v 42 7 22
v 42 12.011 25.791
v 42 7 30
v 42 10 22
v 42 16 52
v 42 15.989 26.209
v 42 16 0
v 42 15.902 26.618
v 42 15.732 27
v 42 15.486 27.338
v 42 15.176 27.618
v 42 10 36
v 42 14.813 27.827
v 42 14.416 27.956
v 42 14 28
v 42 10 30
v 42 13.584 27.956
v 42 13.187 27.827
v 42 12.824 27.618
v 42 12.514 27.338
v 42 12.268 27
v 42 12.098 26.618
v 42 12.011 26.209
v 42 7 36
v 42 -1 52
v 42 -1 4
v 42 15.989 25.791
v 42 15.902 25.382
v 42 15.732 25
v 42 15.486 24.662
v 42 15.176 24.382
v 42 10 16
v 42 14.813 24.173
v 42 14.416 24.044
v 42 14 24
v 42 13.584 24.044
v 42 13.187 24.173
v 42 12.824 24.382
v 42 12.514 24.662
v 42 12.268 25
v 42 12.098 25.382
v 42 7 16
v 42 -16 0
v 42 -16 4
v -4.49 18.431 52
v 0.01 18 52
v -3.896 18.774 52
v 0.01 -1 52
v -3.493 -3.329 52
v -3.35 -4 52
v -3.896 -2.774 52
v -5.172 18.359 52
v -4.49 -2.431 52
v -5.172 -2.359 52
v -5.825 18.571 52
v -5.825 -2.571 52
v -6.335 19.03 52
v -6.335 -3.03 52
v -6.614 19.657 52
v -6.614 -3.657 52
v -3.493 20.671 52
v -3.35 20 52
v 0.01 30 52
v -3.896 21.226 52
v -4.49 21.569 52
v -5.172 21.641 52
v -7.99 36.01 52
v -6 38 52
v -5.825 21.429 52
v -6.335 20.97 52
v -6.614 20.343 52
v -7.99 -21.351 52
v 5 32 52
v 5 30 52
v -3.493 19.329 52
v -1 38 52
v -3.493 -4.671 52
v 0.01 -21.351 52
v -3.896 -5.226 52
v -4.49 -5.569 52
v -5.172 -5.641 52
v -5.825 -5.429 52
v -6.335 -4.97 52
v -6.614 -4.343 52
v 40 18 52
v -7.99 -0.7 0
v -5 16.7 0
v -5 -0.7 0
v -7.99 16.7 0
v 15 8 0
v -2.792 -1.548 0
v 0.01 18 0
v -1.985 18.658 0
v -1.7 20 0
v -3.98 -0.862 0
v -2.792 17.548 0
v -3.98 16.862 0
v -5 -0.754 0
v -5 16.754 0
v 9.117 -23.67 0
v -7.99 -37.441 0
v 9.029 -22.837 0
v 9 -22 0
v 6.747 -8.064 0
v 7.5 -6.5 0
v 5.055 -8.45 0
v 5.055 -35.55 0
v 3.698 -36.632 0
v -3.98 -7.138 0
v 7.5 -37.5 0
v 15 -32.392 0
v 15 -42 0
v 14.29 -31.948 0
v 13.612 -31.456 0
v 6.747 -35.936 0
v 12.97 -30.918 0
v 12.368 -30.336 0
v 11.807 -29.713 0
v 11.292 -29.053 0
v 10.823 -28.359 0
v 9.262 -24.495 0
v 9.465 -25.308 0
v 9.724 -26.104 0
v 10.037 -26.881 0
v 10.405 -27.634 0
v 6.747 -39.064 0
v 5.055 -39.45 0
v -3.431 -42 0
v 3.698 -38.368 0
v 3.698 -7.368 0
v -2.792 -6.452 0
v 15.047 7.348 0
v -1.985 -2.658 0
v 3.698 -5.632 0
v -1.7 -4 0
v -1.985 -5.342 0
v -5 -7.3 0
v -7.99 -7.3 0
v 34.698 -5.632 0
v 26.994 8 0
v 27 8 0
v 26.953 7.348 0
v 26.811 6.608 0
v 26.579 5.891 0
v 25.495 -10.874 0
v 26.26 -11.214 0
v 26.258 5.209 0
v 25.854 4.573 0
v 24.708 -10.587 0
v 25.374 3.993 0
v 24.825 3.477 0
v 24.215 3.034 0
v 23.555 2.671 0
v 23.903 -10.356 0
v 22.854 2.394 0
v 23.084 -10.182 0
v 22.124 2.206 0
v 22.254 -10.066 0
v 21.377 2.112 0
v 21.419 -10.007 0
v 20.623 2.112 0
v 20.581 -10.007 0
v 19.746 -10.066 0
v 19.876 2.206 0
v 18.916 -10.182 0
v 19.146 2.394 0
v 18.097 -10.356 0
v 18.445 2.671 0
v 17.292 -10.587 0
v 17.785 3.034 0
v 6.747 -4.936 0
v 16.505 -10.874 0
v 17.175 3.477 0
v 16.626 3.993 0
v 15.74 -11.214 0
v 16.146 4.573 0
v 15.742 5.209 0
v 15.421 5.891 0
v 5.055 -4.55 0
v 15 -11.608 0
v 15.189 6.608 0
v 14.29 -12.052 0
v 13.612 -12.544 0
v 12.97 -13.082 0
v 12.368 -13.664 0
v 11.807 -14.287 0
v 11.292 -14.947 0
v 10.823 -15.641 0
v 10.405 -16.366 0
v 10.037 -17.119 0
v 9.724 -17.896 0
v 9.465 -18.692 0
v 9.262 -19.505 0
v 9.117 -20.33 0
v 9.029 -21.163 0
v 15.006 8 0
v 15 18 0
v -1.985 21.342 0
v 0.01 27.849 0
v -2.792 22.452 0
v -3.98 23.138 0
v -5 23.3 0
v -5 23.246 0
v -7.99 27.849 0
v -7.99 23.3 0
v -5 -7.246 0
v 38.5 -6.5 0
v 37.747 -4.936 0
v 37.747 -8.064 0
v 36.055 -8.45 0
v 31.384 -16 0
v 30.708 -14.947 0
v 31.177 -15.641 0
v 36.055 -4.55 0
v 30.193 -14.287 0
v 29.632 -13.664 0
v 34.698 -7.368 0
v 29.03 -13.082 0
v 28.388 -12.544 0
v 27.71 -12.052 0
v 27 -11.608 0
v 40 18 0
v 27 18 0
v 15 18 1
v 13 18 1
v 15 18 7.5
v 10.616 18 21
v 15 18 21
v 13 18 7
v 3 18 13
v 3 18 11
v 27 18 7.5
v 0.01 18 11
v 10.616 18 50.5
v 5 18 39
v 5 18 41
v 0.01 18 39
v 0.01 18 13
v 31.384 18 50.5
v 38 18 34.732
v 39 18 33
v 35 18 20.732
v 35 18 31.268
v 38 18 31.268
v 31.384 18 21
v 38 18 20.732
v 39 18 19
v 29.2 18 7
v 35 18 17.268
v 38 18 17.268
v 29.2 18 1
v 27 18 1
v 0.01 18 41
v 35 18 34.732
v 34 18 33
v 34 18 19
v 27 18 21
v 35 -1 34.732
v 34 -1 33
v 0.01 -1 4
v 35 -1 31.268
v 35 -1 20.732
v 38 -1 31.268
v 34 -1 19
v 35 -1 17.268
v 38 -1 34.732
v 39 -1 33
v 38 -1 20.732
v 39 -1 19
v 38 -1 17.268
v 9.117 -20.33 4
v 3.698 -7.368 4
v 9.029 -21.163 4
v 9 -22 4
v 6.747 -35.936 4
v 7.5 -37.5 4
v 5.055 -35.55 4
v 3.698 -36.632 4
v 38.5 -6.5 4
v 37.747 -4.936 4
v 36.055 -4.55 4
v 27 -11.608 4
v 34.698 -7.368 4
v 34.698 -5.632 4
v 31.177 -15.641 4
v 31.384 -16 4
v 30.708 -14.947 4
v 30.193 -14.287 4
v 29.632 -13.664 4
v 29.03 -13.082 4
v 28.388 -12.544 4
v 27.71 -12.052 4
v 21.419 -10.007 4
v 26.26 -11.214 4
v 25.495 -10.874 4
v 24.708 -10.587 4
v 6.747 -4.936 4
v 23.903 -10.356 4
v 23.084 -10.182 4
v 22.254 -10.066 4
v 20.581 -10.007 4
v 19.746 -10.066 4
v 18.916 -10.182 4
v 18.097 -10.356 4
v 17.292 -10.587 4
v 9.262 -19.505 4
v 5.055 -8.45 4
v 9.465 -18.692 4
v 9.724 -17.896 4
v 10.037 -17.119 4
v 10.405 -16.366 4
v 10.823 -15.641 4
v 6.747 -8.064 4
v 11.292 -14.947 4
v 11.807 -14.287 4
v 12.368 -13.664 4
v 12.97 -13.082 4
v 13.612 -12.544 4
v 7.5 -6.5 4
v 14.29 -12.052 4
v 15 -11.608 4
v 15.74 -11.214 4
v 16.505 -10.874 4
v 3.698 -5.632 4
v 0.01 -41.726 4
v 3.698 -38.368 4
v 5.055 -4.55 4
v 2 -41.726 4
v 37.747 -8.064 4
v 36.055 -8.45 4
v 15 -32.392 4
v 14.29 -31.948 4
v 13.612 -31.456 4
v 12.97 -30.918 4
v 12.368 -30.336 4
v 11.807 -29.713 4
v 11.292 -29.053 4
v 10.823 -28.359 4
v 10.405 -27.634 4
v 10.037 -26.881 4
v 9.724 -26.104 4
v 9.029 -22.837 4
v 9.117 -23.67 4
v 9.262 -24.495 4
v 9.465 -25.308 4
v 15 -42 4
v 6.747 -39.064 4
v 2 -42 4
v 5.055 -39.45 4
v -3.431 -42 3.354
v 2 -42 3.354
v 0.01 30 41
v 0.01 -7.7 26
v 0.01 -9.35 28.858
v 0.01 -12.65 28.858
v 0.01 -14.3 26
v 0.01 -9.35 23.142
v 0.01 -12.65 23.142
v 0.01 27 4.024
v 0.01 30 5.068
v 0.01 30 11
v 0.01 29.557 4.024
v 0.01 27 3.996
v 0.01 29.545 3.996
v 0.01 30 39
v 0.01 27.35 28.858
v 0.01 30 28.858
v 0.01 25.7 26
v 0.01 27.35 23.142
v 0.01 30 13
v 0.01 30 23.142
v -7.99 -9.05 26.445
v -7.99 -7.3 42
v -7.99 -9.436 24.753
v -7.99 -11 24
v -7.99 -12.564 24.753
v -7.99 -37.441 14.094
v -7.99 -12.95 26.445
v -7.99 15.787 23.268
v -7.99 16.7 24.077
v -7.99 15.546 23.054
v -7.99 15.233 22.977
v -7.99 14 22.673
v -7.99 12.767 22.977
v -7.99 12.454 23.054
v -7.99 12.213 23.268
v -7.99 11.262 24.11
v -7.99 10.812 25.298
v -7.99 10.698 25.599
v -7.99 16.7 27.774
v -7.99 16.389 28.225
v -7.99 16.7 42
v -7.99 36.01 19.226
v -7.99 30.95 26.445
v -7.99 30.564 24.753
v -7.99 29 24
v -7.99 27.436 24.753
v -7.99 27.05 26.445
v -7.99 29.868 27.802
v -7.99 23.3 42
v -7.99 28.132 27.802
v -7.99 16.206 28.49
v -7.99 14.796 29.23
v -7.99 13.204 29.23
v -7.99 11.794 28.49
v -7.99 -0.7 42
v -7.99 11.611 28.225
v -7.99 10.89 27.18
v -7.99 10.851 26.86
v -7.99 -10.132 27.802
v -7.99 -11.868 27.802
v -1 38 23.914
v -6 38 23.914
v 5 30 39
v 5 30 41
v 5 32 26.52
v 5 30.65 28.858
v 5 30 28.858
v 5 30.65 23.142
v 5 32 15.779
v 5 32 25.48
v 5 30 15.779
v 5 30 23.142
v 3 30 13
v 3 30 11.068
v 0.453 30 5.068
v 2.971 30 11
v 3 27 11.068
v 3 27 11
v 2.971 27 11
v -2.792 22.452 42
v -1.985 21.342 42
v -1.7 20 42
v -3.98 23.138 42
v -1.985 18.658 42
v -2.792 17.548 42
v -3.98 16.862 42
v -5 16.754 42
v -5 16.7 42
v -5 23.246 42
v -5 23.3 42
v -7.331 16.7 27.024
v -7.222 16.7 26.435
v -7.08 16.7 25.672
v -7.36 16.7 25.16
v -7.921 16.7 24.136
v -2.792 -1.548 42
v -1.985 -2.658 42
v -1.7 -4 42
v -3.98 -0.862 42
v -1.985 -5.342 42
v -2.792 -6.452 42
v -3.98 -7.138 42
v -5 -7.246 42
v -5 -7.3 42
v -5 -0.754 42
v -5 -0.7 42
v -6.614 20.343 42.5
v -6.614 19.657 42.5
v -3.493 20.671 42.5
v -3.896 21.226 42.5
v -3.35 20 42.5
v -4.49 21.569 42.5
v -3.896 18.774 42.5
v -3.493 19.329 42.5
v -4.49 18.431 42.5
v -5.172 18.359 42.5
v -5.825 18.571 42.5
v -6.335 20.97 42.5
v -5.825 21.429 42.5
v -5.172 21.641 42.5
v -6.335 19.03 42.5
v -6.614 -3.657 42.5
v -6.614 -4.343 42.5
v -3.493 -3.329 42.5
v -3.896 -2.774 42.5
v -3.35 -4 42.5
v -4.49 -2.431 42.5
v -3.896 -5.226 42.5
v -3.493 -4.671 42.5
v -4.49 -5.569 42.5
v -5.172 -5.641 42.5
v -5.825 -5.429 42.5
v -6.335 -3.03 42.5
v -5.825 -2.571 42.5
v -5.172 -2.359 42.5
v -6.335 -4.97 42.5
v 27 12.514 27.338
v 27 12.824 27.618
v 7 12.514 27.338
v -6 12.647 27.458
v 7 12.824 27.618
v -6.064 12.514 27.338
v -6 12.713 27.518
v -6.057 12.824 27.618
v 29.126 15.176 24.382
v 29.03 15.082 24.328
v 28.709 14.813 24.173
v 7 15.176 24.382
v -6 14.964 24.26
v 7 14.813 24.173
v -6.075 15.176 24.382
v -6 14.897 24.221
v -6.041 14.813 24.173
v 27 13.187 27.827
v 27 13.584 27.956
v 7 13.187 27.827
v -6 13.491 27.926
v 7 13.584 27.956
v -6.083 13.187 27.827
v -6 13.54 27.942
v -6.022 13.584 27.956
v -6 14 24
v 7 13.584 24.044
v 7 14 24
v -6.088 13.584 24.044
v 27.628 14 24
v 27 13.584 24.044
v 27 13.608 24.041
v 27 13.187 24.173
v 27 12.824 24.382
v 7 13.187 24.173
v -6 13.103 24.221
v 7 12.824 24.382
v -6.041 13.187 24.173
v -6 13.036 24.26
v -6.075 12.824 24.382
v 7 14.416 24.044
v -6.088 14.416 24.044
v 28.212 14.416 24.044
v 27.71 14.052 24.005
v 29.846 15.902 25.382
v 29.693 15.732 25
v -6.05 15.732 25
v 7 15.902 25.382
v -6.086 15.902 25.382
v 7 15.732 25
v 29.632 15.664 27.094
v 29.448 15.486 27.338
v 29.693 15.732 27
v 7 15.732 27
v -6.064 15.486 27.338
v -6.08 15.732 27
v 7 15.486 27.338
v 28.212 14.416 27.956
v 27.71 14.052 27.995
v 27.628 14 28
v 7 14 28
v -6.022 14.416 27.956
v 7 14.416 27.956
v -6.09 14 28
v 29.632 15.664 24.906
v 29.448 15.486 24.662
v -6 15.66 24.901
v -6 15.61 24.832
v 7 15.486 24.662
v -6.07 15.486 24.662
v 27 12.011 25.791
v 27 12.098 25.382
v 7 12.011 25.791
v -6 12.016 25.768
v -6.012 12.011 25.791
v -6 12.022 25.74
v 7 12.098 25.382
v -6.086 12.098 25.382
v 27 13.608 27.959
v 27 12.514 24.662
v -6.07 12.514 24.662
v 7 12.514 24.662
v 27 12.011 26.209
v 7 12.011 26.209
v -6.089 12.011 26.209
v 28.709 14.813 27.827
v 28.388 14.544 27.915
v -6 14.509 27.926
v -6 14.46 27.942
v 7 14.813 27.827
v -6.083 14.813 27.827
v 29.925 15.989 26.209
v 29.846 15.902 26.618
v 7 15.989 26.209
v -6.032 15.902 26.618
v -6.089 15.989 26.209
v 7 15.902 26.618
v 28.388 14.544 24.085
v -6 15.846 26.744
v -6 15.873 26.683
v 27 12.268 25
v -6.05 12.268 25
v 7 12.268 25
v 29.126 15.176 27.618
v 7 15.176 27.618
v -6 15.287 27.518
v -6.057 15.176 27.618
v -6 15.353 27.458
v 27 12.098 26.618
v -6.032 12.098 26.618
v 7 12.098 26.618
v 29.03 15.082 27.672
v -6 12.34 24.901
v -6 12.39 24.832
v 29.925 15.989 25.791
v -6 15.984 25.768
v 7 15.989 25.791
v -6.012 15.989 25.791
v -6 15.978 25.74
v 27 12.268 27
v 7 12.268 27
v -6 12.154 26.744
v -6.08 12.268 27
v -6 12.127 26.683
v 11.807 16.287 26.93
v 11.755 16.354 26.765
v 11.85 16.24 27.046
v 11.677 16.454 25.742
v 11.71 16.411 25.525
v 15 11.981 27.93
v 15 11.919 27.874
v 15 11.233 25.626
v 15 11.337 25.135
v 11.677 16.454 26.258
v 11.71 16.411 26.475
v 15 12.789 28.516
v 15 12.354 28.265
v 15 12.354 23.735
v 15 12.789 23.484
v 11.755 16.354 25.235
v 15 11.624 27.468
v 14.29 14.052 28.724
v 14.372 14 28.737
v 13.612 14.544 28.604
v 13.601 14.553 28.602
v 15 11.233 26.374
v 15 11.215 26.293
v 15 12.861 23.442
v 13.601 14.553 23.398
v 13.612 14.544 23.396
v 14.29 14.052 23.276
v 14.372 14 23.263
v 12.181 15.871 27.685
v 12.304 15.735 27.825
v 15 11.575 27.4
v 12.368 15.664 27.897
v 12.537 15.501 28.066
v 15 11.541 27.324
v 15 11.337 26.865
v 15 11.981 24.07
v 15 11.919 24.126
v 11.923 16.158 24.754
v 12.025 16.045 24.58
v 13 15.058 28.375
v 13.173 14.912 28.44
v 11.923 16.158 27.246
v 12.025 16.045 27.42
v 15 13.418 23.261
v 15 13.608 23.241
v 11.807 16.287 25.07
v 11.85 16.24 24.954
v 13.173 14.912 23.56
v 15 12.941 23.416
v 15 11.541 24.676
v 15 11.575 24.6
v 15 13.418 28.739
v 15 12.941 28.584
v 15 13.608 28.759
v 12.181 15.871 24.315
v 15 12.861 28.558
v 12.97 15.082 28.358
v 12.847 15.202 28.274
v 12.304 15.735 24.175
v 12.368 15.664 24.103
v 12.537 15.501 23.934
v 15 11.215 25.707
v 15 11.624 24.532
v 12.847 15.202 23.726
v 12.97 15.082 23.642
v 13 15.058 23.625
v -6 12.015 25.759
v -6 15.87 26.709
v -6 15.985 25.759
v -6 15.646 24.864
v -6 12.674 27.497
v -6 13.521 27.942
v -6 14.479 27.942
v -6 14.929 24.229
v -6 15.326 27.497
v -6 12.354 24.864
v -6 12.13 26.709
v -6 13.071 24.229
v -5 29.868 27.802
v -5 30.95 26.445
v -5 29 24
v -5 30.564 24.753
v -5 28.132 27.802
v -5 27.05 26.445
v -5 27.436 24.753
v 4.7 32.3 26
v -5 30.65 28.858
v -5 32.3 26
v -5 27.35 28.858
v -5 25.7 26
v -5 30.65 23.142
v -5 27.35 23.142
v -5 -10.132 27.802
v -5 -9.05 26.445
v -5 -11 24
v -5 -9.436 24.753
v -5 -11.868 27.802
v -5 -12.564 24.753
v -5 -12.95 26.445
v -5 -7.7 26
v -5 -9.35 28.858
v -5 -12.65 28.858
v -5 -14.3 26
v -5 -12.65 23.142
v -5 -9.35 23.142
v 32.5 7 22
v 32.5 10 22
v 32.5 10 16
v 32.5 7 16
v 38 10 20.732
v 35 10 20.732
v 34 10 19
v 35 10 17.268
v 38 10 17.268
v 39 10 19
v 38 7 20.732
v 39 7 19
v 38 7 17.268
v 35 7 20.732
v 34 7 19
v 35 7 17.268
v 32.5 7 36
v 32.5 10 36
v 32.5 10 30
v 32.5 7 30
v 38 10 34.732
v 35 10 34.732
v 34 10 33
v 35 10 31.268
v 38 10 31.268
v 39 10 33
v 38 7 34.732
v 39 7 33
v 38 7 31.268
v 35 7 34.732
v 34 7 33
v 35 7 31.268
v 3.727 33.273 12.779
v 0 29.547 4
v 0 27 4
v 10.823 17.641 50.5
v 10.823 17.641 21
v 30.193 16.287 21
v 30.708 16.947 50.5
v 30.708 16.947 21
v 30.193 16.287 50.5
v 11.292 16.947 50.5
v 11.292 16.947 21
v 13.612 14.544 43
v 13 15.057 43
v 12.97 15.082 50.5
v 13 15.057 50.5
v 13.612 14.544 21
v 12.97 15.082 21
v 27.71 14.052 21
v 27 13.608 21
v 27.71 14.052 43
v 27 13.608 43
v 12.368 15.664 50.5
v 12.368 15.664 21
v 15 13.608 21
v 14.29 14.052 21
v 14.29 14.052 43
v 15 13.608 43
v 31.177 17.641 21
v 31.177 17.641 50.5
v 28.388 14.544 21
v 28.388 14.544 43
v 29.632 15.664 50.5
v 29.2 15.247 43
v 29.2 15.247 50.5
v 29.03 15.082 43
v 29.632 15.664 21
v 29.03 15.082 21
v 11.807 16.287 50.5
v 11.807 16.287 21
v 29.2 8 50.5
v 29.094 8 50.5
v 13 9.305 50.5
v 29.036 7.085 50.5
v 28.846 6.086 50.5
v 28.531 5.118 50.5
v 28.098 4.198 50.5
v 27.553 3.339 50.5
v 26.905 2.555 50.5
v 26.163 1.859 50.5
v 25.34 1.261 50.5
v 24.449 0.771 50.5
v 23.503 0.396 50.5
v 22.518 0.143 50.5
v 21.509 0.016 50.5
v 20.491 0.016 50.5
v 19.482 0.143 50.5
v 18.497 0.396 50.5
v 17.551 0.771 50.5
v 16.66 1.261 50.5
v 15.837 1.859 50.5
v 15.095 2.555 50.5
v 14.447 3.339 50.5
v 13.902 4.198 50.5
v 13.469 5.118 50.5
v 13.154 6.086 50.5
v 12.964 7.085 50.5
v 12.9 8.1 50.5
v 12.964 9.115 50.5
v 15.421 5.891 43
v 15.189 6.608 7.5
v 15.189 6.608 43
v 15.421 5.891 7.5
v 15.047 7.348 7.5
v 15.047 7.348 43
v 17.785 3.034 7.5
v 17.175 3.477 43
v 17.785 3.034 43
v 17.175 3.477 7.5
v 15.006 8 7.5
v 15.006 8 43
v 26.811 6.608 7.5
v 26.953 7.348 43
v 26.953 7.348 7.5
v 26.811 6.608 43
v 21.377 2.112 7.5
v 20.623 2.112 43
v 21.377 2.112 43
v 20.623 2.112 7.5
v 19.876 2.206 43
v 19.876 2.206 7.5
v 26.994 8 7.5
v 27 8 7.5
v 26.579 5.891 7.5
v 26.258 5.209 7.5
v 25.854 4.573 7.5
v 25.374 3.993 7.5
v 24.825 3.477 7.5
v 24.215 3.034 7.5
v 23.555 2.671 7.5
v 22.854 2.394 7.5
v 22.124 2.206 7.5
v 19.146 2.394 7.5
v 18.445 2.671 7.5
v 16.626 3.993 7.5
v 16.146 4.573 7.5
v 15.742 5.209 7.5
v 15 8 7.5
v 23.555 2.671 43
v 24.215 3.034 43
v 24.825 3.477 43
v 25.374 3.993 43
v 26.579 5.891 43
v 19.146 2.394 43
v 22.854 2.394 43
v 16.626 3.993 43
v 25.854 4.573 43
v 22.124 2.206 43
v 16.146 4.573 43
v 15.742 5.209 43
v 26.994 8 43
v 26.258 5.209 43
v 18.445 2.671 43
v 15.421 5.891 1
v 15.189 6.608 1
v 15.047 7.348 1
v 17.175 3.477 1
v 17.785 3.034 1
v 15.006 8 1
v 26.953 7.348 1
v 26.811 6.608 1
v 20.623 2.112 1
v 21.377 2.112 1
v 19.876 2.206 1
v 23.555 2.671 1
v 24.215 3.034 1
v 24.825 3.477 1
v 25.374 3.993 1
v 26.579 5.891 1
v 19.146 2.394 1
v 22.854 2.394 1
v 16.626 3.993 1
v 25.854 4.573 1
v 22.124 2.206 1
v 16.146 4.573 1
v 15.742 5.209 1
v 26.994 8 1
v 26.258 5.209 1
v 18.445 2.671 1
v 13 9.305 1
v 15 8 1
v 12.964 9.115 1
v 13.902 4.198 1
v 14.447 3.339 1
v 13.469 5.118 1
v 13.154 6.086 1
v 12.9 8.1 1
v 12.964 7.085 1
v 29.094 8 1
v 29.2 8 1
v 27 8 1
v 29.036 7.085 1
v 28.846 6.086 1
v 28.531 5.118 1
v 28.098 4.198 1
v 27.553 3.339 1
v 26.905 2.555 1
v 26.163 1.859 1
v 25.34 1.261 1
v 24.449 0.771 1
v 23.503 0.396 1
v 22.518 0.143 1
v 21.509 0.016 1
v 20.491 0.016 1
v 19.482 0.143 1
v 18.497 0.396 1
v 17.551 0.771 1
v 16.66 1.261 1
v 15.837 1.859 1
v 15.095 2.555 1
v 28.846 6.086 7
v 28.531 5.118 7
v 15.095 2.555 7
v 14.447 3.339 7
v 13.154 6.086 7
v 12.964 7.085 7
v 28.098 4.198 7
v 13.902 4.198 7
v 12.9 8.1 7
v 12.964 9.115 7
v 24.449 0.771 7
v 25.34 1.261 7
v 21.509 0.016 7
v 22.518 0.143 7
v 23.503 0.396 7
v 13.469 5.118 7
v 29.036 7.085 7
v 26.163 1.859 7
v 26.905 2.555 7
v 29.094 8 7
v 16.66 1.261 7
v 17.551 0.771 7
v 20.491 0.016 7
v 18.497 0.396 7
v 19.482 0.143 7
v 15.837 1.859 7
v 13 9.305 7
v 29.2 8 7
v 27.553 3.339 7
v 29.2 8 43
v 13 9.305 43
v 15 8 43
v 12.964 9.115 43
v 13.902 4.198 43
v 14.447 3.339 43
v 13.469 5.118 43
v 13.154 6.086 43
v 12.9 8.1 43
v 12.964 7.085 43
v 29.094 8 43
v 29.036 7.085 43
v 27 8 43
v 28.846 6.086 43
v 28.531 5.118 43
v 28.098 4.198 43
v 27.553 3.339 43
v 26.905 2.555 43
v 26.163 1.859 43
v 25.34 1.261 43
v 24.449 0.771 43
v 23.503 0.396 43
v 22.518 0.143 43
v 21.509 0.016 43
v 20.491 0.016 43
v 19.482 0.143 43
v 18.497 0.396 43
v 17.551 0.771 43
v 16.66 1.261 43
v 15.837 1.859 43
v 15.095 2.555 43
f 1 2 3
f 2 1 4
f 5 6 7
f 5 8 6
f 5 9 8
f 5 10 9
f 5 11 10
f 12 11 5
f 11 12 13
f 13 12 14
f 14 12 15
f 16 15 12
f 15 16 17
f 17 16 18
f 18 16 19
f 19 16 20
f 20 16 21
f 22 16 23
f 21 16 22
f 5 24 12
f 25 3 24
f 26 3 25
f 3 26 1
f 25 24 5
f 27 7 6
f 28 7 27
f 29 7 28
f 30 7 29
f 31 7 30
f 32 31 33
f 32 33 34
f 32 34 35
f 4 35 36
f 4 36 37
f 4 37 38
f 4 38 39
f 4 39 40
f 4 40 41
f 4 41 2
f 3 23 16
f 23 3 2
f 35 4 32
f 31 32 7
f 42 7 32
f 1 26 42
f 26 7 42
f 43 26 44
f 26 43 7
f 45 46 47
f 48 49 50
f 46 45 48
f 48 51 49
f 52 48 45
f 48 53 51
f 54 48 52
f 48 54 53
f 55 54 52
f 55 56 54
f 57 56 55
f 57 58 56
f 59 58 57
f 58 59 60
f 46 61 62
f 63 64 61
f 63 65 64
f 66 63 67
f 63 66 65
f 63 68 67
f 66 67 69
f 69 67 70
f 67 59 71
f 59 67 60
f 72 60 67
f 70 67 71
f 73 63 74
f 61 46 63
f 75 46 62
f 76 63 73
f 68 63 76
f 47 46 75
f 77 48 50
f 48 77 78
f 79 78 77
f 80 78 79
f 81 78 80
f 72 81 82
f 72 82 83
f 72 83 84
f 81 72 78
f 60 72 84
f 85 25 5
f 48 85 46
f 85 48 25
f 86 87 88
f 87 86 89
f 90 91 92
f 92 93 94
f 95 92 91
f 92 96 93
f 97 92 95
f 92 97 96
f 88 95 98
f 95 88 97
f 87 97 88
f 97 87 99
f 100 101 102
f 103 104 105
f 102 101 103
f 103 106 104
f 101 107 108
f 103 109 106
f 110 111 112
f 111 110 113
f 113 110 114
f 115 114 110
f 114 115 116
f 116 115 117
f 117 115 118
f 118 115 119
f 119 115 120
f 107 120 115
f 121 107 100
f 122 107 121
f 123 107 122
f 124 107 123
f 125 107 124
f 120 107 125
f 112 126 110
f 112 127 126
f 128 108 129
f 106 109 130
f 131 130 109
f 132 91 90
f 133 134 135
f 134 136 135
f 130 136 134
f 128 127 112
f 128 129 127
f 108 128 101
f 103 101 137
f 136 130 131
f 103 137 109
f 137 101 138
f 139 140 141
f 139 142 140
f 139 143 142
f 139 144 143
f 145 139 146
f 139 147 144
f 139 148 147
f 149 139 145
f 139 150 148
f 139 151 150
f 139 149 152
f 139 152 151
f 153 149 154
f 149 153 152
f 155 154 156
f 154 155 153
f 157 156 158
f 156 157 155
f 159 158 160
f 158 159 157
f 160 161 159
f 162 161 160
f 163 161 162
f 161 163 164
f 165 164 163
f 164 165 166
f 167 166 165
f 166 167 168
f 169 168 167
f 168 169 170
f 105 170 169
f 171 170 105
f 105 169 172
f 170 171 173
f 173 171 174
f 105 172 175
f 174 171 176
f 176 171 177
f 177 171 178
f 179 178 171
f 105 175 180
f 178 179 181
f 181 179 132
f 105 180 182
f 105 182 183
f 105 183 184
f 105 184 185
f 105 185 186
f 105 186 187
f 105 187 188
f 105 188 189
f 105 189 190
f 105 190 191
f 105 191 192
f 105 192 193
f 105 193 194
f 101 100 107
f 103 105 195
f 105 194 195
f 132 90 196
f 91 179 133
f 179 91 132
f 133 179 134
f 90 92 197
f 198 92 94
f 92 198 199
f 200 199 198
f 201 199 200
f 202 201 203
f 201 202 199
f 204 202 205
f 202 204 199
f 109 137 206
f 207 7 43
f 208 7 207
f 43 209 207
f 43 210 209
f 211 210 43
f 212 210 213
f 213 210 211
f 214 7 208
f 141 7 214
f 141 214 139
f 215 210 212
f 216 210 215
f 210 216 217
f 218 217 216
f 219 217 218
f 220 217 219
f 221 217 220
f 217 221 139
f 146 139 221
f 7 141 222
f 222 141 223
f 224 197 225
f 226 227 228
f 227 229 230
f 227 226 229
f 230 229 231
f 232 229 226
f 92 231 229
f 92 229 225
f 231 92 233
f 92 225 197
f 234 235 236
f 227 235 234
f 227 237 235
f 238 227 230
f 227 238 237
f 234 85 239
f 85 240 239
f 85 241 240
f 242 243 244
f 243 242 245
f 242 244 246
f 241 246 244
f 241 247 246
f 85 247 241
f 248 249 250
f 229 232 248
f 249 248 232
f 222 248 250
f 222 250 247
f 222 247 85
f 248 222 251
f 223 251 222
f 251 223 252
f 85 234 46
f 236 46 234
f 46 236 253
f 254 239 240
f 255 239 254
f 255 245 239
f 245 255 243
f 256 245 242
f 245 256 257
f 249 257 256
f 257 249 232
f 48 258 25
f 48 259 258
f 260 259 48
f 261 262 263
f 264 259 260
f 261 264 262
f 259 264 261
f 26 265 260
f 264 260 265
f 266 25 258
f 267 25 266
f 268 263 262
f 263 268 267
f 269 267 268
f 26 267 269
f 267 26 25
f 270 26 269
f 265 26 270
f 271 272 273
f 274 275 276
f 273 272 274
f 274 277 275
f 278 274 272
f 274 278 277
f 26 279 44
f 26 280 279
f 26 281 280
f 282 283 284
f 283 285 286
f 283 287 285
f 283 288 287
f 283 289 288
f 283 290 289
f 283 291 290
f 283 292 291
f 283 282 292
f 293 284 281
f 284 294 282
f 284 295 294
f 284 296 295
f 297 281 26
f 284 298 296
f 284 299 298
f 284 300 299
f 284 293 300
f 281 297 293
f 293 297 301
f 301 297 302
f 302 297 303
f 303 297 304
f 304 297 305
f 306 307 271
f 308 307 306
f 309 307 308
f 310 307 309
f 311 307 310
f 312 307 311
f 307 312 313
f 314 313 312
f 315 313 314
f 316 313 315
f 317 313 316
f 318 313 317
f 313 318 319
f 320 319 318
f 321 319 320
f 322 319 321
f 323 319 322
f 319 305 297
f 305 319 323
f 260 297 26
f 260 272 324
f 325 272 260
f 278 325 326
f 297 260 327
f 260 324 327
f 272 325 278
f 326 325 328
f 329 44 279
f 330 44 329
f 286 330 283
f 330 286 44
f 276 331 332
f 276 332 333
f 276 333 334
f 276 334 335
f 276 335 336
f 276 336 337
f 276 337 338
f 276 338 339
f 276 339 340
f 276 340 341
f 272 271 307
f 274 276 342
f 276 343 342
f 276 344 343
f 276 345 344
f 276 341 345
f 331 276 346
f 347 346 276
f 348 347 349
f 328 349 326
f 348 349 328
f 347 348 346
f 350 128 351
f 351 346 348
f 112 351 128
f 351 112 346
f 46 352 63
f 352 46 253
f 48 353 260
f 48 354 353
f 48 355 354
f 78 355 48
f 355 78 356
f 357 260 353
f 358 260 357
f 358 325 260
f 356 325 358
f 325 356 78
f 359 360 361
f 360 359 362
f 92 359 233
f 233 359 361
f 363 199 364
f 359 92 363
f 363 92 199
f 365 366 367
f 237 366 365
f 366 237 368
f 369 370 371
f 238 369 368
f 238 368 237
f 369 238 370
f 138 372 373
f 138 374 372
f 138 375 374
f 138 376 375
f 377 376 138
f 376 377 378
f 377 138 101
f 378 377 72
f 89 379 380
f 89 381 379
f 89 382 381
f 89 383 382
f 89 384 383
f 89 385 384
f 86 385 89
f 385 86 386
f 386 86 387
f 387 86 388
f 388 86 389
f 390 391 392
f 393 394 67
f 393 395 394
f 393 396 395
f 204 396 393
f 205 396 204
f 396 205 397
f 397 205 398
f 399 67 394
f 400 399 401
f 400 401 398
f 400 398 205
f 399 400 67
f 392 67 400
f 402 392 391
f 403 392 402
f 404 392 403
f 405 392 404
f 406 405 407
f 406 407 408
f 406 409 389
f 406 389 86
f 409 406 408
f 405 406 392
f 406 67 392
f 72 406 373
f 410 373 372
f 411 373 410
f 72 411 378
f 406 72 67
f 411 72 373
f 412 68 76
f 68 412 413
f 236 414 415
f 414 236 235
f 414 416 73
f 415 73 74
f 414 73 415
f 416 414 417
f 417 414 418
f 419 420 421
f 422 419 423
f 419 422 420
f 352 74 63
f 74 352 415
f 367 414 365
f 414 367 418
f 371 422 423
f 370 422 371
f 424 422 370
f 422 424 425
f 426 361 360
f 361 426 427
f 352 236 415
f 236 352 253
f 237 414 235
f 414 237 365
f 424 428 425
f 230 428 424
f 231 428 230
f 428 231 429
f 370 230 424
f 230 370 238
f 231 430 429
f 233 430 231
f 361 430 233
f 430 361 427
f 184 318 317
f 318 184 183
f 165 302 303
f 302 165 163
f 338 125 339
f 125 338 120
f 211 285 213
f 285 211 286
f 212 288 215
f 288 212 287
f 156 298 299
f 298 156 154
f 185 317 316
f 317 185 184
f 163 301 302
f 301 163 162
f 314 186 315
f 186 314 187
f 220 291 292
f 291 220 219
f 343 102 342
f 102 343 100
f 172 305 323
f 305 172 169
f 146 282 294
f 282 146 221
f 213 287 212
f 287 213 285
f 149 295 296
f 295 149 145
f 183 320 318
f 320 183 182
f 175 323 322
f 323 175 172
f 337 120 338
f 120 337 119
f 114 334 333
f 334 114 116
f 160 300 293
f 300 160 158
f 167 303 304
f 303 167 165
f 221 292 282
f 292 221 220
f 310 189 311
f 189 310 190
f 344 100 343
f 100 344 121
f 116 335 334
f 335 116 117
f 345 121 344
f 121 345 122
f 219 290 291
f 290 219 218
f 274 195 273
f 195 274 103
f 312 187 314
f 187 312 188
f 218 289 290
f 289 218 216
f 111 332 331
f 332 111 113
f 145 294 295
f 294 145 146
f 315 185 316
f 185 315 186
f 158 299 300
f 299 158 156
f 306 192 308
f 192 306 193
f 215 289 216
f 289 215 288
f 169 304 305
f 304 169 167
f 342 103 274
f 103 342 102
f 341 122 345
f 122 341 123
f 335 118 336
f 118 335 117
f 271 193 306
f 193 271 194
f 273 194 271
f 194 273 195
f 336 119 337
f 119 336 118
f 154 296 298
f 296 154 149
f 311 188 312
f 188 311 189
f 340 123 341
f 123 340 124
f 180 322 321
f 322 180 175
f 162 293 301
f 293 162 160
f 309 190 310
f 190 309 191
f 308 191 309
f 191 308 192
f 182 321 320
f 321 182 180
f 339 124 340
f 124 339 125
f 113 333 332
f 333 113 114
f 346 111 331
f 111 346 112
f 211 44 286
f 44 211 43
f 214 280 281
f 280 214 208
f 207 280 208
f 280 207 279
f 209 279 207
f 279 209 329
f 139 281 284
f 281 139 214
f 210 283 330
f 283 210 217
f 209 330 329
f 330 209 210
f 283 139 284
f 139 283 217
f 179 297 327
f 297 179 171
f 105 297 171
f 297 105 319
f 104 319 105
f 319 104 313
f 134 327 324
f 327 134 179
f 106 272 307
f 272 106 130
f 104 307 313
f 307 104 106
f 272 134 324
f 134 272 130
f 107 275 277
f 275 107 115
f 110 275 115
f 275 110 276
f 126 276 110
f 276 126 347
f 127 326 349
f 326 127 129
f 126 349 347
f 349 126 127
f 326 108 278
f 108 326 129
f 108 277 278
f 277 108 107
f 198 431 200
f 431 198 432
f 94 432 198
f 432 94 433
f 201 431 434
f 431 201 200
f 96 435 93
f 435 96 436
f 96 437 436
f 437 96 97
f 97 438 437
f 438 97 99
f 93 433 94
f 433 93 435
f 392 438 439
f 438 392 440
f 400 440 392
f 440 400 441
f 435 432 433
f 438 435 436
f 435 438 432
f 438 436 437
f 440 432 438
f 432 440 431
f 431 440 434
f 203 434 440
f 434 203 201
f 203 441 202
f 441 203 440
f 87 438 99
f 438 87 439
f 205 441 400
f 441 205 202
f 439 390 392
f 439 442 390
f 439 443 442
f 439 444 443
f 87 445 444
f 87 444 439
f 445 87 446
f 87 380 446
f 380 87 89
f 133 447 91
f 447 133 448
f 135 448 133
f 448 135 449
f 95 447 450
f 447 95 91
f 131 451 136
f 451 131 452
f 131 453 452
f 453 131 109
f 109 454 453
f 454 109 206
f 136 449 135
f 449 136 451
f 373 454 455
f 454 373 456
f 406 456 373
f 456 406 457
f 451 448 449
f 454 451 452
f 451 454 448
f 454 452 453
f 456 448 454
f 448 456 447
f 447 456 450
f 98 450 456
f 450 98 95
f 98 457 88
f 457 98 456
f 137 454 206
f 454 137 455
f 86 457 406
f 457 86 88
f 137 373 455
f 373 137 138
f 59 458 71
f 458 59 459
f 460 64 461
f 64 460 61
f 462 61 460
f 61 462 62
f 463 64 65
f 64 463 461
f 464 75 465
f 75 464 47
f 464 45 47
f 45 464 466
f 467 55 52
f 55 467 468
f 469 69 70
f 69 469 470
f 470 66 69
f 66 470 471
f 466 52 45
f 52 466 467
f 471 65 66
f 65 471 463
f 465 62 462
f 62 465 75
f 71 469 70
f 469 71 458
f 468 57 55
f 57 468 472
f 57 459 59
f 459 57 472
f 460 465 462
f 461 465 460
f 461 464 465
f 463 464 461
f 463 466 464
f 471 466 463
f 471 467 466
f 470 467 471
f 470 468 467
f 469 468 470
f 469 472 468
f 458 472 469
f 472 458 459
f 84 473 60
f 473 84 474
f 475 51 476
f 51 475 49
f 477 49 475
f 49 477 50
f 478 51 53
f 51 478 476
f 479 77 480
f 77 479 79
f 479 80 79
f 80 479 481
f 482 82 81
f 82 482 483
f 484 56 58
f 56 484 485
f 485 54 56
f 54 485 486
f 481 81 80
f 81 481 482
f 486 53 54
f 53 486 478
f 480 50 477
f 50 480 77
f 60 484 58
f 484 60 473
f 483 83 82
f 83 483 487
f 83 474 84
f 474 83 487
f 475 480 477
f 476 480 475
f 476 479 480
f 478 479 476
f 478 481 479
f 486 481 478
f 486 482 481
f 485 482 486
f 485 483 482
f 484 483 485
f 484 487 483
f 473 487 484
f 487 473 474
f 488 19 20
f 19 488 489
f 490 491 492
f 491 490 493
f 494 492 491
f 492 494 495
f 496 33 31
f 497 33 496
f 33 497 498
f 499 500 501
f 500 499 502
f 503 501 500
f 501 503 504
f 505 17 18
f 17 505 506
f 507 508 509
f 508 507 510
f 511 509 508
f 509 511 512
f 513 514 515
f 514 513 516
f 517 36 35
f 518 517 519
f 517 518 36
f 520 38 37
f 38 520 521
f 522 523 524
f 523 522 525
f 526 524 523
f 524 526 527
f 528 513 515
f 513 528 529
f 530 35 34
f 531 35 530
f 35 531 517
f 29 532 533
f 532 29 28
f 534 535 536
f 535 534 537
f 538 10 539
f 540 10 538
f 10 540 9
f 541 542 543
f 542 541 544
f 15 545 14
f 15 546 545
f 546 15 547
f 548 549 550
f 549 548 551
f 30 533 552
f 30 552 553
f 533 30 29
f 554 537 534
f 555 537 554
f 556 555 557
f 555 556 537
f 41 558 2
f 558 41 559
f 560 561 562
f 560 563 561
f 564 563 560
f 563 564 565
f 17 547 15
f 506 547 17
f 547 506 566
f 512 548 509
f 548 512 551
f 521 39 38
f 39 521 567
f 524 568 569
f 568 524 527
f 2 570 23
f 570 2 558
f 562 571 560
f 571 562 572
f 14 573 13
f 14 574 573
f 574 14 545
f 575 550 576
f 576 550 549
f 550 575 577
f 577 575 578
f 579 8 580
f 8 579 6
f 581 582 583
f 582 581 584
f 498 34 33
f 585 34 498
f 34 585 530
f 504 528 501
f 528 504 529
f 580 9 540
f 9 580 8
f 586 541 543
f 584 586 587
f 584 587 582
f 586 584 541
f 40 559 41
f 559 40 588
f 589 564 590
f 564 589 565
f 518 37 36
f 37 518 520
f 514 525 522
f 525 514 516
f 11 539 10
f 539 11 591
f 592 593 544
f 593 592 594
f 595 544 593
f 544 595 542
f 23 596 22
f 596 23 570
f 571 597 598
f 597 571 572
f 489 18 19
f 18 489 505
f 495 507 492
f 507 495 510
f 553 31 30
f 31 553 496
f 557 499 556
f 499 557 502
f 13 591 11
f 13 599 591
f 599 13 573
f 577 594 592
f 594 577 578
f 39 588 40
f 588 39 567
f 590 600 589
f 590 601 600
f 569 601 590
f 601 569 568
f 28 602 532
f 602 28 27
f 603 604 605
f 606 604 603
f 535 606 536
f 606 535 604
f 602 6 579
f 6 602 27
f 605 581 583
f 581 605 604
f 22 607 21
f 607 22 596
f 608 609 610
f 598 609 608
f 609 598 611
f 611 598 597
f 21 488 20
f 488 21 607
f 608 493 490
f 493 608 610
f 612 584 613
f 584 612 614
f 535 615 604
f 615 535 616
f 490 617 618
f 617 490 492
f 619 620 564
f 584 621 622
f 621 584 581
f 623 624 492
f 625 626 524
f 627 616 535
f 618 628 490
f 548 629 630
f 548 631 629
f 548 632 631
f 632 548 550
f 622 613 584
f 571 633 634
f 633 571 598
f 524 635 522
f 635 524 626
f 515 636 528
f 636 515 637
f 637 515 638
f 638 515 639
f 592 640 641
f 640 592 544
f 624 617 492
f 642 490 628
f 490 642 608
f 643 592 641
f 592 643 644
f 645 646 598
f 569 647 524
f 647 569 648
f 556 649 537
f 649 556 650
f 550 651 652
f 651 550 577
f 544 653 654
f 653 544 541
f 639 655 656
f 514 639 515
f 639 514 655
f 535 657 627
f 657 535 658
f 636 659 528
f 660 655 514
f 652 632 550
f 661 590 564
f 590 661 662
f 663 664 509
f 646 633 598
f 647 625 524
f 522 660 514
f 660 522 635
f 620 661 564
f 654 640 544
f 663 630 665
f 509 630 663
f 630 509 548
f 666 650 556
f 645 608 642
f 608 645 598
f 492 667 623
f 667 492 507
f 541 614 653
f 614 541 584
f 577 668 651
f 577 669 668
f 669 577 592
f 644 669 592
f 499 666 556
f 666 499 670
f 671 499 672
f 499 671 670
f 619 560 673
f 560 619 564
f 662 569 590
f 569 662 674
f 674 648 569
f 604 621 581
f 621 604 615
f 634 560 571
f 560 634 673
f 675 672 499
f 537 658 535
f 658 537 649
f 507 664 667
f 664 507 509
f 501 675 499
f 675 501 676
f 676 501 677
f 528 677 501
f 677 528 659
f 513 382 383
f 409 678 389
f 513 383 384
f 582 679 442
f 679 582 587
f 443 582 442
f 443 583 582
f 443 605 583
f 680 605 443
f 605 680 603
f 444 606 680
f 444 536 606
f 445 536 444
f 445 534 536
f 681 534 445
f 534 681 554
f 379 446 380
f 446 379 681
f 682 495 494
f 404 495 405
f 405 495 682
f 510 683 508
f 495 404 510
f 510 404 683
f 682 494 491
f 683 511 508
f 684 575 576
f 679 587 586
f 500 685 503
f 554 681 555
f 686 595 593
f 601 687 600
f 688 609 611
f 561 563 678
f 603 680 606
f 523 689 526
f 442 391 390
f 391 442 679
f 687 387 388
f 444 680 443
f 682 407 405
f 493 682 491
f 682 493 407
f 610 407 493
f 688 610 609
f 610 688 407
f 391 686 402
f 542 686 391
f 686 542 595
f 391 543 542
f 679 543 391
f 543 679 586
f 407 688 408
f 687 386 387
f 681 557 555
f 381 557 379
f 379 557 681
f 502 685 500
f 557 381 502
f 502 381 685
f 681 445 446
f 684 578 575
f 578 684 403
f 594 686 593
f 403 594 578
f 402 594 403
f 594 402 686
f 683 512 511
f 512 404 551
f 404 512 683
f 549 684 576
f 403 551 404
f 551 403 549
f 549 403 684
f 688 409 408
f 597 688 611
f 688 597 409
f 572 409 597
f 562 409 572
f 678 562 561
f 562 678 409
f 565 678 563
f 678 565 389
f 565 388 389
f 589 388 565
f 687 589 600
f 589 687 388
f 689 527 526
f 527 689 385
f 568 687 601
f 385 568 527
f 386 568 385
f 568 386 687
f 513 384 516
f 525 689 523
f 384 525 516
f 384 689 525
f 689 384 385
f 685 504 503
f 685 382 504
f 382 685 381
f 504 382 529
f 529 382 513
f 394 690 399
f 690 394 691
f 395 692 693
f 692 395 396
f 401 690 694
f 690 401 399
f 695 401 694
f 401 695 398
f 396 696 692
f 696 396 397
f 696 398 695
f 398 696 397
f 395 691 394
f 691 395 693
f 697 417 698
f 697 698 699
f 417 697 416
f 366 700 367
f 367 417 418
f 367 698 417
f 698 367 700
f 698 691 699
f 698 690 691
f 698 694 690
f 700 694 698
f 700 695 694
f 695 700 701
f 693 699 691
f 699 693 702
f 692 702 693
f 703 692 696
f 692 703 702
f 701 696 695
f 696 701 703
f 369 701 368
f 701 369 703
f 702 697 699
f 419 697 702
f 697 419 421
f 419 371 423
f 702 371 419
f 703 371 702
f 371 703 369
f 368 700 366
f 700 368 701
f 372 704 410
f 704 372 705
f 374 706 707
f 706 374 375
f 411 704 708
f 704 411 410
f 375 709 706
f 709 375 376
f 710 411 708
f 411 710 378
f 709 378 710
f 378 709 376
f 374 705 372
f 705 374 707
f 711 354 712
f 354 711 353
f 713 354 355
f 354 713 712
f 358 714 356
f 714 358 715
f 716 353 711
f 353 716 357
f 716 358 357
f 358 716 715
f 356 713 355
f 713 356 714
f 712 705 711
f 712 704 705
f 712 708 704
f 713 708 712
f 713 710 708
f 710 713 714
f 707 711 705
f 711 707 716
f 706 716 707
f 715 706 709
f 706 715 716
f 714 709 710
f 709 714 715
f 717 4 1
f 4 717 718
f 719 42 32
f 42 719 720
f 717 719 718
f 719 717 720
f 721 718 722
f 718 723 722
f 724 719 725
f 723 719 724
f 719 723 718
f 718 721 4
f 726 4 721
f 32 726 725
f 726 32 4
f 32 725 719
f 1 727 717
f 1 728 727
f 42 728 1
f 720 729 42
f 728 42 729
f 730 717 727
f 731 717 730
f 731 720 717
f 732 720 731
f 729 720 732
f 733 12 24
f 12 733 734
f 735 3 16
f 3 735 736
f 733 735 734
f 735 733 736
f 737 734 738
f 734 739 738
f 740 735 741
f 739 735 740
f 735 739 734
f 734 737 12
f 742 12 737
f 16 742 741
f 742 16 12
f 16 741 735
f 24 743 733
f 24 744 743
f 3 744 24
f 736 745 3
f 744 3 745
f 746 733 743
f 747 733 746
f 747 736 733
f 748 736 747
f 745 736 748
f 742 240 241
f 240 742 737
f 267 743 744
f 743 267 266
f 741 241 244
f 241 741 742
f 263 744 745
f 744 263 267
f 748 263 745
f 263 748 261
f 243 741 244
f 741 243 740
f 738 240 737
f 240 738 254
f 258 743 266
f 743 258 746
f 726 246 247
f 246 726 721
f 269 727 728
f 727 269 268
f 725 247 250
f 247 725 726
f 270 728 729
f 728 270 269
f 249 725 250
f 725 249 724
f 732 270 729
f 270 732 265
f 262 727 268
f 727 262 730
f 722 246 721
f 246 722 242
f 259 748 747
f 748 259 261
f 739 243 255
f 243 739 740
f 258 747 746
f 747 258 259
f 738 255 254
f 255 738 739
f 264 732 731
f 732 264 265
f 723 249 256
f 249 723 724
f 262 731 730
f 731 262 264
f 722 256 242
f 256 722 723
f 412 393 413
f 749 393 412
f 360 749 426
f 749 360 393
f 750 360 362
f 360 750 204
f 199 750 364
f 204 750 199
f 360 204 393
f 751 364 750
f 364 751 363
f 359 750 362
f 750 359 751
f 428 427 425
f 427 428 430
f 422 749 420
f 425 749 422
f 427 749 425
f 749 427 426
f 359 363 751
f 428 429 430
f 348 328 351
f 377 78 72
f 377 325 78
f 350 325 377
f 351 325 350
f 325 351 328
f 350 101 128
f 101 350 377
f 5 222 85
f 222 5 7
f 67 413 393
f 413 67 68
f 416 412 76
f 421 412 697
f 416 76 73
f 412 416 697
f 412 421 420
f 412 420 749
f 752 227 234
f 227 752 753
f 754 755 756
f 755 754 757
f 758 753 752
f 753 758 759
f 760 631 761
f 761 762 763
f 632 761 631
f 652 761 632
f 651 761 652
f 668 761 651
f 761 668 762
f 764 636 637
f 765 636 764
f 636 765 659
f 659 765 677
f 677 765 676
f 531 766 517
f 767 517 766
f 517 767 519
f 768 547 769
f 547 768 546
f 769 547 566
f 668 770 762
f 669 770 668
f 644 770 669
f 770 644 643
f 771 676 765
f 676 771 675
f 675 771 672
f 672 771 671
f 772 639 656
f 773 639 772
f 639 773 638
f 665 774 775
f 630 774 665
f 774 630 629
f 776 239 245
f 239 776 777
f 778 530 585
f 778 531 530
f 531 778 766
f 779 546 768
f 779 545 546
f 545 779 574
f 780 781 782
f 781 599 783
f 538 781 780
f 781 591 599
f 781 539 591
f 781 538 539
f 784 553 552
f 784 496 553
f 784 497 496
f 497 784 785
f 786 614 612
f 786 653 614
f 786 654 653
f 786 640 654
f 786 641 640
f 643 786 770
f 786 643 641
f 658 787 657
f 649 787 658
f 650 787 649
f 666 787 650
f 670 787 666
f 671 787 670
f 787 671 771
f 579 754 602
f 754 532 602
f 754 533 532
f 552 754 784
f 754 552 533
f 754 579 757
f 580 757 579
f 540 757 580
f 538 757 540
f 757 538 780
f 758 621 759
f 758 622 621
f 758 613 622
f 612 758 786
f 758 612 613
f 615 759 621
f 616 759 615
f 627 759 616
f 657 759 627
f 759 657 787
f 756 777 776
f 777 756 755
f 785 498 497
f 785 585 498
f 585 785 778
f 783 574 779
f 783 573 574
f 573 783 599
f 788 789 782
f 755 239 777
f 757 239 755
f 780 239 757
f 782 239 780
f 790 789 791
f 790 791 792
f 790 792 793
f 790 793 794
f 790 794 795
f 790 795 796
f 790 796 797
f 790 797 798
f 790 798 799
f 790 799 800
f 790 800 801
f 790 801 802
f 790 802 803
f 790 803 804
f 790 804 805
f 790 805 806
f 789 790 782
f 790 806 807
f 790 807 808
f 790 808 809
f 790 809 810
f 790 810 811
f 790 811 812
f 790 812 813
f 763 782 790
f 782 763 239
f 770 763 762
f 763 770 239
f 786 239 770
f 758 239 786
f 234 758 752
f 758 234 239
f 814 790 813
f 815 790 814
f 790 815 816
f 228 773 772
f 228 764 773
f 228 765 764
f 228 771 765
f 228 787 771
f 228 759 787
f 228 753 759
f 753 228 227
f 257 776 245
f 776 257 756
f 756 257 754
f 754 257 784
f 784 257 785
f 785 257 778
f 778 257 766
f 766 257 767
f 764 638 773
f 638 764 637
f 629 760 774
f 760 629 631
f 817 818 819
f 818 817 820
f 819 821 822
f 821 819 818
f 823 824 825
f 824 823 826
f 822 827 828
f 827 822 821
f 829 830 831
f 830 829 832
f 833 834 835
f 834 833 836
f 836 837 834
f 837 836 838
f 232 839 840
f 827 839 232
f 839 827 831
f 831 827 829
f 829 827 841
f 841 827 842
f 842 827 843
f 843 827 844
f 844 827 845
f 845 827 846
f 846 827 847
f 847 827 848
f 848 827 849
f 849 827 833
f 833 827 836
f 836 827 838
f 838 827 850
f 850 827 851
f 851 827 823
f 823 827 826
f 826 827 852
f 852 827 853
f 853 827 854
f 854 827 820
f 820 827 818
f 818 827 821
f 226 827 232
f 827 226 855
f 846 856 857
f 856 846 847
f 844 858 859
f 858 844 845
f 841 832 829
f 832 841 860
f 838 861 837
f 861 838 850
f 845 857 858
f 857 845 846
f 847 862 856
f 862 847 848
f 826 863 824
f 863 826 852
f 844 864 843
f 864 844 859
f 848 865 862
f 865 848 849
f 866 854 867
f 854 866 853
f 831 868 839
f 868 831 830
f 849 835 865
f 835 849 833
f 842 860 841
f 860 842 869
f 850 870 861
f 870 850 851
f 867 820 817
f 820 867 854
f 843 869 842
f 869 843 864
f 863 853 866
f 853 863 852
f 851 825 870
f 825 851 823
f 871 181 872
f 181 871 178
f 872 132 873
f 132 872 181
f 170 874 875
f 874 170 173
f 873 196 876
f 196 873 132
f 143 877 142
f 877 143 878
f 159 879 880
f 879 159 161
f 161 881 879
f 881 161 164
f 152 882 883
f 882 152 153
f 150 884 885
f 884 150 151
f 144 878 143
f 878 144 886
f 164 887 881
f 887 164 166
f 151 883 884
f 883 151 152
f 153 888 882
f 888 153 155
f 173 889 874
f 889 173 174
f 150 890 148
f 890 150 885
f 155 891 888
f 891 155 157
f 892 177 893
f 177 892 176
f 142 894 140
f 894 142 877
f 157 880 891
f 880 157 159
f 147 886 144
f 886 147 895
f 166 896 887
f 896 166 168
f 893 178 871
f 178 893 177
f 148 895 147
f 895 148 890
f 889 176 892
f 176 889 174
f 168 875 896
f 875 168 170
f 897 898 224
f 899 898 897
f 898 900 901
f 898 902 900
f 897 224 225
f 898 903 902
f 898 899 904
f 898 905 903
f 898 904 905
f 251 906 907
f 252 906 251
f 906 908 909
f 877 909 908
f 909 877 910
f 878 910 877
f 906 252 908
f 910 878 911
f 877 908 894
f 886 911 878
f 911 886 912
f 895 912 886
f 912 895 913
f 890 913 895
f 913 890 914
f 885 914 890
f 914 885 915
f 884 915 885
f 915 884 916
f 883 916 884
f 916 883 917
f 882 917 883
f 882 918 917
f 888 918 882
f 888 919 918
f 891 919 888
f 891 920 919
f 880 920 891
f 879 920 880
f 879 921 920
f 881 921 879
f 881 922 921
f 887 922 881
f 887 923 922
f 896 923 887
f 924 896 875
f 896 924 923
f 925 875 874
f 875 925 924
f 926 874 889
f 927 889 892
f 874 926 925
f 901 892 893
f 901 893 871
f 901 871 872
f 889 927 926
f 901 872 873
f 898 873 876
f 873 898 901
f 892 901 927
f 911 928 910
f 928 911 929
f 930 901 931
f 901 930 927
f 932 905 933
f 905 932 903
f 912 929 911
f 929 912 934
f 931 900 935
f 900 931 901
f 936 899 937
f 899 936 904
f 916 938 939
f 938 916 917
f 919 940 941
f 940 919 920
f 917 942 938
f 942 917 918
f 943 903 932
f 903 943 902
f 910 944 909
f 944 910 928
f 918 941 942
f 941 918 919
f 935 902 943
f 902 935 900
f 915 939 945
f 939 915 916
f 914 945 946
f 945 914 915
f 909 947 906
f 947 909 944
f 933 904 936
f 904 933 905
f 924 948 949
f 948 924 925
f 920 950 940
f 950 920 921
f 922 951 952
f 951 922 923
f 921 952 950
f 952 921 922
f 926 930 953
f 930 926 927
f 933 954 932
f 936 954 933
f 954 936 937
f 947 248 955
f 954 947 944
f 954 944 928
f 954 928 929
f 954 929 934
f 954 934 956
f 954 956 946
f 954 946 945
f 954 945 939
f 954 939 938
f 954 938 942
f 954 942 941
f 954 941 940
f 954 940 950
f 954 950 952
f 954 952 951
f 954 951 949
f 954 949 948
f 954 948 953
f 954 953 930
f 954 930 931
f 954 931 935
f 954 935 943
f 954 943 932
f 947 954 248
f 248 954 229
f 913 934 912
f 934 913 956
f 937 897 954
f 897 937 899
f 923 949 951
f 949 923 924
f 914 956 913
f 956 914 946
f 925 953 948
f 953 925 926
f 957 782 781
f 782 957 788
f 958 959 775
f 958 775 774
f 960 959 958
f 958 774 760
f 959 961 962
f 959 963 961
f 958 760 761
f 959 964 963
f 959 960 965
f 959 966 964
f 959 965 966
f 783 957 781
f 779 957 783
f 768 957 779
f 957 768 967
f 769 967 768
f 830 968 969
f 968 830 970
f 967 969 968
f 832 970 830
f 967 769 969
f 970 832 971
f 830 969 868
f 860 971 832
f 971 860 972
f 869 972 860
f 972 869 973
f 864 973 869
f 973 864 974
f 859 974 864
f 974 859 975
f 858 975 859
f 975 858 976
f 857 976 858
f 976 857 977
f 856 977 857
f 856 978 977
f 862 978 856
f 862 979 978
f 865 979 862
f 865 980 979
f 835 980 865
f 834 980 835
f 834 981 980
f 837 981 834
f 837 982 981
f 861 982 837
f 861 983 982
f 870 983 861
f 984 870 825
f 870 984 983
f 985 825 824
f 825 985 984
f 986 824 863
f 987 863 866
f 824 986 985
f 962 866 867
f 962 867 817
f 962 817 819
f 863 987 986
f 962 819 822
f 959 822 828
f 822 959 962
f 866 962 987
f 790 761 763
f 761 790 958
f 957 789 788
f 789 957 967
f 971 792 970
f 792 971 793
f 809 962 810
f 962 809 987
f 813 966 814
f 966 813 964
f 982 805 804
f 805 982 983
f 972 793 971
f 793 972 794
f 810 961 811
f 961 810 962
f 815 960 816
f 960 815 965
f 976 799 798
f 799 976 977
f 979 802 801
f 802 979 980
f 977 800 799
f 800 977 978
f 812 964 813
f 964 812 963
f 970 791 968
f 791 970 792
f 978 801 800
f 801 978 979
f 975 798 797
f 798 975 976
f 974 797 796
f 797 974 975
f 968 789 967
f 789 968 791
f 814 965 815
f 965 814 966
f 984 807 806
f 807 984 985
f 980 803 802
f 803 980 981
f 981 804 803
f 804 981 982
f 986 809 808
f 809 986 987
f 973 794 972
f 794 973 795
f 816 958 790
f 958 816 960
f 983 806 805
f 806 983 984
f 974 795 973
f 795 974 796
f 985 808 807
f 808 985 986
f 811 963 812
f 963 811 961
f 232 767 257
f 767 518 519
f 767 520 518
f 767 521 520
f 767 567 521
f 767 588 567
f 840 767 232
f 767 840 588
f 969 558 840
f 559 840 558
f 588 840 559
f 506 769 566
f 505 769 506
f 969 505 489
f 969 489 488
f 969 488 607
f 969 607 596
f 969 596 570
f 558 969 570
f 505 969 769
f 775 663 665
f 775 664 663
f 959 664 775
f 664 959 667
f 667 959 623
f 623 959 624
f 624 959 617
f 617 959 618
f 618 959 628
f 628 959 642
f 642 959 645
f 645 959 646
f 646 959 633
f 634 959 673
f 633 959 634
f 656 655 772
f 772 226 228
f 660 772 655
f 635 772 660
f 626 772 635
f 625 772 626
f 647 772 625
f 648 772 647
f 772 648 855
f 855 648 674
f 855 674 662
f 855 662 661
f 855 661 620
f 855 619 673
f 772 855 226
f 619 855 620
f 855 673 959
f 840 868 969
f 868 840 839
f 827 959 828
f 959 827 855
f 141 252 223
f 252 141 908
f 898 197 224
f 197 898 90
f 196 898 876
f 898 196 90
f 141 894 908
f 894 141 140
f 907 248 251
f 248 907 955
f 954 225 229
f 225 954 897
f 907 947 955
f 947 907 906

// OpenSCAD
// PRUSA iteration3
// NEMA 17 extruder body
// GNU GPL v3
// Josef Průša <iam@josefprusa.cz>, Kliment Yanev and contributors
// http://www.reprap.org/wiki/Prusa_Mendel
// http://prusamendel.org

module nozzlemount(){
rotate([0,90,0]) cylinder(r=2, h=70, $fn=30);
translate([17,0,0]) rotate([0,90,0]) cylinder(r2=3,r1=2, h=10, $fn=30);
translate([1,0,0]) rotate([0,90,0]) cylinder(r1=4, r2=2, h=3);
translate([0,15,0]) rotate([0,90,0]) cylinder(r=2, h=70);
translate([10-5,15,0]) rotate([0,90,0]) rotate([0,0,30]) cylinder(r=3.3, h=70,$fn=6);
translate([0,-25,0]) rotate([0,90,0]) cylinder(r=2, h=70);
translate([10-5,-25,0]) rotate([0,90,0]) rotate([0,0,30])cylinder(r=3.3, h=70,$fn=6);
}


difference(){
union(){
translate([0,-1,0])cube([42,19,52]);
translate([0,-42,0]) cube([42,42+3,4]);
translate([-7.99,-42,0]) cube([8,80,52]);

translate([-1,30,0]) cube([6, 7, 52]);


translate([-1,15,51-12]) cube([6, 20, 2]);
translate([-1,15,23-12]) cube([4, 20, 2]);

}

//antiwarpagenation

translate([46,-91,-1])rotate([0,0,45])cube(40);
translate([-11,-91,-1])rotate([0,0,45])cube([40,40,60]);
translate([46,12,-1])rotate([0,0,45])cube([40,40,60]);
translate([-32,12,-1])rotate([0,0,45])cube([40,40,60]);
translate([6,31,-1])rotate([0,0,45])cube([40,40,60]);

// motor circle cut
translate([0,-1,0.5]){
translate([21,-21,-1]) cylinder(r=12, h=5, $fn=90);

 translate([15,-45,-1]) cube([30,30,5]);

translate([21+15.5,-21+15.5,-1]) cylinder(r=2, h=5);
translate([21+15.5,-21-15.5,-1]) cylinder(r=2, h=5);
translate([21-15.5,-21+15.5,-1]) cylinder(r=2, h=5);
translate([21-15.5,-21-15.5,-1]) cylinder(r=2, h=5);
}



// idler bearing cutout

translate([21,24,33-12]) cylinder(r=12, h=17.5+12, $fn=90);



translate([21,8.1,7.5]) cylinder(r=6, h=43, $fn=50);

translate([21,8.1,-1]) cylinder(r=6, h=3, $fn=50);
// Second filament drive bearing
translate([21,8.1,1]) cylinder(r=8.1, h=6, $fn=50);
// Second filament drive bearing insert cutout

translate([13,8,43]) cube([16.2,20,7.5]);


translate([21,8.1,-5+52-4]) cylinder(r=8.1, h=7.5, $fn=50);
translate([-6+21,8,7.5]) cube([12,12,40]);

translate([-6+21,8,-50+7]) cube([12,12,50]);


translate([13,8,1]) cube([16.2,20,6]);

//mounting to carriage
translate([-5,20,-28]){
translate([0,0,0])rotate([0,0,0])cylinder(r=3.3, h=70, $fn=15);
translate([-3.3*2,-3.3,0])rotate([0,0,0])cube([3.3*2,3.3*2,70]);
translate([0,0-24,0])rotate([0,0,0])cylinder(r=3.3, h=70, $fn=15);
translate([-3.3*2,0-24-3.3,0])rotate([0,0,0])cube([3.3*2,3.3*2,70]);
#translate([0,0,70.5])rotate([0,0,0])cylinder(r=3.3/2, h=70, $fn=15);
translate([0,0-24,70.5])rotate([0,0,0])cylinder(r=3.3/2, h=70, $fn=15);
}

// idler nuts and filament channels

translate([0,0,-2]){
translate([-10,2+8+4,52-52/2+2]) nozzlemount();
//translate([-10,2+8+4,52-12-25]) nozzlemount();

translate([32.5,7,52-52/2+2-7-3]) cube([15,3,6]);

translate([32.5,7,52-52/2+2-7-3+14]) cube([15,3,6]);


//translate([5+32,-1,52-52/2+2+7]) rotate([0,90,90]) rotate([0,0,30]) cylinder(r=3.3, h=10, $fn=6);
//translate([5+32,-1,52-52/2+2-7]) rotate([0,90,90]) rotate([0,0,30]) cylinder(r=3.3, h=10, $fn=6);



translate([5+32,-1,52-52/2+2+7]) rotate([0,90,90]) rotate([0,0,30]) cylinder(r=2, h=40, $fn=6);
translate([5+32,-1,52-52/2+2-7]) rotate([0,90,90]) rotate([0,0,30]) cylinder(r=2, h=40, $fn=6);
translate([5+31,-1,52-52/2+2+7]) rotate([0,90,90]) rotate([0,0,30]) cylinder(r=2, h=40, $fn=6);
translate([5+31,-1,52-52/2+2-7]) rotate([0,90,90]) rotate([0,0,30]) cylinder(r=2, h=40, $fn=6);


// pretty cutout
translate([-10,27,0]) rotate([-23,0,0]) cube([20,12,50]);
translate([0,27,6]) rotate([0,23,0]) cube([20,12,50]);

// pretty cutout
translate([-10,-66,0]) rotate([-23,0,0]) cube([12,20,90]);

}
}
